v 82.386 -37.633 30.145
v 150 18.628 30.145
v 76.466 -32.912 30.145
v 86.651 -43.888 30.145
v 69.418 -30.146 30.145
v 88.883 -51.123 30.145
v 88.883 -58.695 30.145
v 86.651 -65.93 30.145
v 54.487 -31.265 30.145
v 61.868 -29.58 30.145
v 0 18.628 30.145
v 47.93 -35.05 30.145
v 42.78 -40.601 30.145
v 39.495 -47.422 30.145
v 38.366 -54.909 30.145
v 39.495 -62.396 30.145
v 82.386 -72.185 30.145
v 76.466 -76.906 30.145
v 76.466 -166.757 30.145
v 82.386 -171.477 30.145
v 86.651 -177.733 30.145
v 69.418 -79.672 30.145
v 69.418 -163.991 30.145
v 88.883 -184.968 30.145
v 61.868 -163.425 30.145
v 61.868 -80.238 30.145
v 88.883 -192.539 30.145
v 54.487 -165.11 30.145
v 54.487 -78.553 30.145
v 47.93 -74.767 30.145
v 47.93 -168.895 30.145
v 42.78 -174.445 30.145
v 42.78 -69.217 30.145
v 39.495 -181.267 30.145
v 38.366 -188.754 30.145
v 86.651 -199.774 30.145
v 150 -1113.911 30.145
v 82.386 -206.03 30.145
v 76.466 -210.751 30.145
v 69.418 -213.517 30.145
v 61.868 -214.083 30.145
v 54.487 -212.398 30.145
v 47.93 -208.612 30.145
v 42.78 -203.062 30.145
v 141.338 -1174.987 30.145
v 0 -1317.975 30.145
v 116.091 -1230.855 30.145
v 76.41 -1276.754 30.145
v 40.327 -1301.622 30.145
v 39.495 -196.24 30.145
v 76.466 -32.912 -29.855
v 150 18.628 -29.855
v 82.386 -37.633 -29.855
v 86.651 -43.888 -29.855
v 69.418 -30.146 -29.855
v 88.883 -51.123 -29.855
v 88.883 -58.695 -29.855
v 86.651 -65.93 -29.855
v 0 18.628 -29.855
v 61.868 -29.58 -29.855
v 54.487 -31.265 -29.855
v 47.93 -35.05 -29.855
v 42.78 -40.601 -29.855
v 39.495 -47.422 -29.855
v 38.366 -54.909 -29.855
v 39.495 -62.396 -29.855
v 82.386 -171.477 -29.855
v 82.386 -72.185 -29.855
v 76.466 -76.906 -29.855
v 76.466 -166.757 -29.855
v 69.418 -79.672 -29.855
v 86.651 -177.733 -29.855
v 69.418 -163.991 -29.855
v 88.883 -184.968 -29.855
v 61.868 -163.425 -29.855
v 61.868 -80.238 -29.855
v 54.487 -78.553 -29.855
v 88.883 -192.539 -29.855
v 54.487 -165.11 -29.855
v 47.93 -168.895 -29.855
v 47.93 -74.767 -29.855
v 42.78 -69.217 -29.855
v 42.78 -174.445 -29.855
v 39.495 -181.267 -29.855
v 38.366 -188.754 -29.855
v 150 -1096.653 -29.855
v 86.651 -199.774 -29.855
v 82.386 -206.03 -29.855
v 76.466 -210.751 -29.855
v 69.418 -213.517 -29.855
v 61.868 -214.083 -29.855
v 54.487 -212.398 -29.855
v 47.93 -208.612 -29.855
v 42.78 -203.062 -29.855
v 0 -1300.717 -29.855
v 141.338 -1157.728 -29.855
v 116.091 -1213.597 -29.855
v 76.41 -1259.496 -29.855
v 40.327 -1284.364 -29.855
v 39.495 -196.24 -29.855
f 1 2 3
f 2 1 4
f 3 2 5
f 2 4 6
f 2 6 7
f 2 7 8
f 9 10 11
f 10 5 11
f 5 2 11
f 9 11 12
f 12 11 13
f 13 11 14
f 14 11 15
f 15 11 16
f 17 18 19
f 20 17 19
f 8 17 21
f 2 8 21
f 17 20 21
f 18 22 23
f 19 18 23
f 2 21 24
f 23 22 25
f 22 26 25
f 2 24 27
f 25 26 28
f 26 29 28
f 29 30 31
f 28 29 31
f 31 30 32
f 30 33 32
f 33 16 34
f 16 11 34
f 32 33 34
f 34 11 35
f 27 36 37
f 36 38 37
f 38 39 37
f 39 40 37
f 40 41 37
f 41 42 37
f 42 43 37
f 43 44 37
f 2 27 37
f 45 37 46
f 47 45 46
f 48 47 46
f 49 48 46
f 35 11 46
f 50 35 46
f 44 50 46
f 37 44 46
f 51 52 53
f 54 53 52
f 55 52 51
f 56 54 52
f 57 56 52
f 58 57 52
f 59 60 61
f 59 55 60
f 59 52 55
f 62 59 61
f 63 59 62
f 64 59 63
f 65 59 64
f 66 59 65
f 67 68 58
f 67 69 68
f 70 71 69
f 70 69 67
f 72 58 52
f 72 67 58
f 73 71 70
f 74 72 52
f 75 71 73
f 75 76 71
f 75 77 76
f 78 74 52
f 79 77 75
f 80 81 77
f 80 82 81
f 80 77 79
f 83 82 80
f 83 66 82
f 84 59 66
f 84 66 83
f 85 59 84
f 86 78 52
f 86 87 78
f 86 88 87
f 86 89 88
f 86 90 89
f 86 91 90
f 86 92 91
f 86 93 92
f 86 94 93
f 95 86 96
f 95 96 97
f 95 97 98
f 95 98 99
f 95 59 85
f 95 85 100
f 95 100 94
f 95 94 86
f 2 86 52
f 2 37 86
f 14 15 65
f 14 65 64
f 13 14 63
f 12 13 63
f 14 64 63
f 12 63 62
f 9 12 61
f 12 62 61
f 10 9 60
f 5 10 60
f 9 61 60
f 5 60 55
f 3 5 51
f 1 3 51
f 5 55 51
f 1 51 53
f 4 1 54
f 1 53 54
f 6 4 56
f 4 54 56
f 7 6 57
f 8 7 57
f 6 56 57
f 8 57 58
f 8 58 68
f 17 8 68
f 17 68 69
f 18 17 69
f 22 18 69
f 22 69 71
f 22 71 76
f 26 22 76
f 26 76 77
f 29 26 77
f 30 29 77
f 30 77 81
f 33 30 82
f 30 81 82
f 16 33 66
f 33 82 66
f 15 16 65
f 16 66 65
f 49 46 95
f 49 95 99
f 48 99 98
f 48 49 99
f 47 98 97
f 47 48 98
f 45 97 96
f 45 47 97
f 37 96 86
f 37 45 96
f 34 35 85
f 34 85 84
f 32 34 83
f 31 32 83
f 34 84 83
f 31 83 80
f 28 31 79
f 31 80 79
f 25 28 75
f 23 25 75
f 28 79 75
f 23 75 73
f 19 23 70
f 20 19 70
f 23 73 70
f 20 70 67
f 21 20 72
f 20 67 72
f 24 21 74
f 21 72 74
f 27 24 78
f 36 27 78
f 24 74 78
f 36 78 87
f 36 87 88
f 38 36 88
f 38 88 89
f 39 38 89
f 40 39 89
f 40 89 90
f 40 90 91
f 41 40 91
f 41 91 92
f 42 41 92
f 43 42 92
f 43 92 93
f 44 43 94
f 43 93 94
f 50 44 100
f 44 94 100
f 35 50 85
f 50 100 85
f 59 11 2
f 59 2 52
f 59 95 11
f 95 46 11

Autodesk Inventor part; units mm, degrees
ref_plane "YZ Plane" through (0, 0, 0) normal (1, 0, 0) x (0, 1, 0)
ref_plane "XZ Plane" through (0, 0, 0) normal (0, 1, 0) x (-1, 0, 0)
ref_plane "XY Plane" through (0, 0, 0) normal (0, 0, 1) x (1, 0, 0)
sketch "Sketch1" plane through (0, 0, 0) normal (1, 0, 0) x (0, 1, 0)
  line L0 (18.6276, 30.145) -> (-681.3735, 30.145)
  line L1 (18.6276, 30.145) -> (18.6276, -29.8549)
  line L2 (18.6276, -29.8549) -> (-681.3735, -29.8549)
  line L3 (-681.3735, 30.145) -> (-1317.975, 30.145)
  line L4 (-1317.975, 30.145) -> (-1300.7166, -29.8549)
  line L5 (-1300.7166, -29.8549) -> (-681.3735, -29.8549)
  point P0 (0, 0)
  dimension "d0" = 700.0011
  dimension "d1" = 59.9999
extrude "Extrusion1" add sketch "Sketch1" along normal blind 150
sketch "Sketch2" plane through (0, 18.6276, 30.145) normal (0, 1, 0) x (1, 0, 0)
  line L0 (30.0948, 48.0392) -> (130.9532, 48.0392) construction
  line L1 (130.9532, 48.0392) -> (130.9532, 12.2508) construction
  line L2 (130.9532, 12.2508) -> (30.0948, 12.2508) construction
  line L3 (30.0948, 12.2508) -> (30.0948, 48.0392) construction
  point P0 (0, 30.145)
fillet "Fillet1" [suppressed]
chamfer "Chamfer1" [suppressed]
sketch "Sketch3" plane through (150, 18.6276, -29.8549) normal (0, 0, -1) x (-1, 0, 0)
  circle A0 centre (86.2337, -73.5365) radius 25.4
  circle A1 centre (86.2337, -207.3813) radius 25.4
  point P0 (150, -18.6276)
  dimension "d8" = 50.8
  dimension "d9" = 50.8
extrude "Extrusion2" cut sketch "Sketch3" against normal blind 150
fillet "Fillet2" radius 203.2 1 edges at (150, -1309.3458, 0.1451)
properties part number "legplate" material "Steel, High Strength, Low Alloy"
